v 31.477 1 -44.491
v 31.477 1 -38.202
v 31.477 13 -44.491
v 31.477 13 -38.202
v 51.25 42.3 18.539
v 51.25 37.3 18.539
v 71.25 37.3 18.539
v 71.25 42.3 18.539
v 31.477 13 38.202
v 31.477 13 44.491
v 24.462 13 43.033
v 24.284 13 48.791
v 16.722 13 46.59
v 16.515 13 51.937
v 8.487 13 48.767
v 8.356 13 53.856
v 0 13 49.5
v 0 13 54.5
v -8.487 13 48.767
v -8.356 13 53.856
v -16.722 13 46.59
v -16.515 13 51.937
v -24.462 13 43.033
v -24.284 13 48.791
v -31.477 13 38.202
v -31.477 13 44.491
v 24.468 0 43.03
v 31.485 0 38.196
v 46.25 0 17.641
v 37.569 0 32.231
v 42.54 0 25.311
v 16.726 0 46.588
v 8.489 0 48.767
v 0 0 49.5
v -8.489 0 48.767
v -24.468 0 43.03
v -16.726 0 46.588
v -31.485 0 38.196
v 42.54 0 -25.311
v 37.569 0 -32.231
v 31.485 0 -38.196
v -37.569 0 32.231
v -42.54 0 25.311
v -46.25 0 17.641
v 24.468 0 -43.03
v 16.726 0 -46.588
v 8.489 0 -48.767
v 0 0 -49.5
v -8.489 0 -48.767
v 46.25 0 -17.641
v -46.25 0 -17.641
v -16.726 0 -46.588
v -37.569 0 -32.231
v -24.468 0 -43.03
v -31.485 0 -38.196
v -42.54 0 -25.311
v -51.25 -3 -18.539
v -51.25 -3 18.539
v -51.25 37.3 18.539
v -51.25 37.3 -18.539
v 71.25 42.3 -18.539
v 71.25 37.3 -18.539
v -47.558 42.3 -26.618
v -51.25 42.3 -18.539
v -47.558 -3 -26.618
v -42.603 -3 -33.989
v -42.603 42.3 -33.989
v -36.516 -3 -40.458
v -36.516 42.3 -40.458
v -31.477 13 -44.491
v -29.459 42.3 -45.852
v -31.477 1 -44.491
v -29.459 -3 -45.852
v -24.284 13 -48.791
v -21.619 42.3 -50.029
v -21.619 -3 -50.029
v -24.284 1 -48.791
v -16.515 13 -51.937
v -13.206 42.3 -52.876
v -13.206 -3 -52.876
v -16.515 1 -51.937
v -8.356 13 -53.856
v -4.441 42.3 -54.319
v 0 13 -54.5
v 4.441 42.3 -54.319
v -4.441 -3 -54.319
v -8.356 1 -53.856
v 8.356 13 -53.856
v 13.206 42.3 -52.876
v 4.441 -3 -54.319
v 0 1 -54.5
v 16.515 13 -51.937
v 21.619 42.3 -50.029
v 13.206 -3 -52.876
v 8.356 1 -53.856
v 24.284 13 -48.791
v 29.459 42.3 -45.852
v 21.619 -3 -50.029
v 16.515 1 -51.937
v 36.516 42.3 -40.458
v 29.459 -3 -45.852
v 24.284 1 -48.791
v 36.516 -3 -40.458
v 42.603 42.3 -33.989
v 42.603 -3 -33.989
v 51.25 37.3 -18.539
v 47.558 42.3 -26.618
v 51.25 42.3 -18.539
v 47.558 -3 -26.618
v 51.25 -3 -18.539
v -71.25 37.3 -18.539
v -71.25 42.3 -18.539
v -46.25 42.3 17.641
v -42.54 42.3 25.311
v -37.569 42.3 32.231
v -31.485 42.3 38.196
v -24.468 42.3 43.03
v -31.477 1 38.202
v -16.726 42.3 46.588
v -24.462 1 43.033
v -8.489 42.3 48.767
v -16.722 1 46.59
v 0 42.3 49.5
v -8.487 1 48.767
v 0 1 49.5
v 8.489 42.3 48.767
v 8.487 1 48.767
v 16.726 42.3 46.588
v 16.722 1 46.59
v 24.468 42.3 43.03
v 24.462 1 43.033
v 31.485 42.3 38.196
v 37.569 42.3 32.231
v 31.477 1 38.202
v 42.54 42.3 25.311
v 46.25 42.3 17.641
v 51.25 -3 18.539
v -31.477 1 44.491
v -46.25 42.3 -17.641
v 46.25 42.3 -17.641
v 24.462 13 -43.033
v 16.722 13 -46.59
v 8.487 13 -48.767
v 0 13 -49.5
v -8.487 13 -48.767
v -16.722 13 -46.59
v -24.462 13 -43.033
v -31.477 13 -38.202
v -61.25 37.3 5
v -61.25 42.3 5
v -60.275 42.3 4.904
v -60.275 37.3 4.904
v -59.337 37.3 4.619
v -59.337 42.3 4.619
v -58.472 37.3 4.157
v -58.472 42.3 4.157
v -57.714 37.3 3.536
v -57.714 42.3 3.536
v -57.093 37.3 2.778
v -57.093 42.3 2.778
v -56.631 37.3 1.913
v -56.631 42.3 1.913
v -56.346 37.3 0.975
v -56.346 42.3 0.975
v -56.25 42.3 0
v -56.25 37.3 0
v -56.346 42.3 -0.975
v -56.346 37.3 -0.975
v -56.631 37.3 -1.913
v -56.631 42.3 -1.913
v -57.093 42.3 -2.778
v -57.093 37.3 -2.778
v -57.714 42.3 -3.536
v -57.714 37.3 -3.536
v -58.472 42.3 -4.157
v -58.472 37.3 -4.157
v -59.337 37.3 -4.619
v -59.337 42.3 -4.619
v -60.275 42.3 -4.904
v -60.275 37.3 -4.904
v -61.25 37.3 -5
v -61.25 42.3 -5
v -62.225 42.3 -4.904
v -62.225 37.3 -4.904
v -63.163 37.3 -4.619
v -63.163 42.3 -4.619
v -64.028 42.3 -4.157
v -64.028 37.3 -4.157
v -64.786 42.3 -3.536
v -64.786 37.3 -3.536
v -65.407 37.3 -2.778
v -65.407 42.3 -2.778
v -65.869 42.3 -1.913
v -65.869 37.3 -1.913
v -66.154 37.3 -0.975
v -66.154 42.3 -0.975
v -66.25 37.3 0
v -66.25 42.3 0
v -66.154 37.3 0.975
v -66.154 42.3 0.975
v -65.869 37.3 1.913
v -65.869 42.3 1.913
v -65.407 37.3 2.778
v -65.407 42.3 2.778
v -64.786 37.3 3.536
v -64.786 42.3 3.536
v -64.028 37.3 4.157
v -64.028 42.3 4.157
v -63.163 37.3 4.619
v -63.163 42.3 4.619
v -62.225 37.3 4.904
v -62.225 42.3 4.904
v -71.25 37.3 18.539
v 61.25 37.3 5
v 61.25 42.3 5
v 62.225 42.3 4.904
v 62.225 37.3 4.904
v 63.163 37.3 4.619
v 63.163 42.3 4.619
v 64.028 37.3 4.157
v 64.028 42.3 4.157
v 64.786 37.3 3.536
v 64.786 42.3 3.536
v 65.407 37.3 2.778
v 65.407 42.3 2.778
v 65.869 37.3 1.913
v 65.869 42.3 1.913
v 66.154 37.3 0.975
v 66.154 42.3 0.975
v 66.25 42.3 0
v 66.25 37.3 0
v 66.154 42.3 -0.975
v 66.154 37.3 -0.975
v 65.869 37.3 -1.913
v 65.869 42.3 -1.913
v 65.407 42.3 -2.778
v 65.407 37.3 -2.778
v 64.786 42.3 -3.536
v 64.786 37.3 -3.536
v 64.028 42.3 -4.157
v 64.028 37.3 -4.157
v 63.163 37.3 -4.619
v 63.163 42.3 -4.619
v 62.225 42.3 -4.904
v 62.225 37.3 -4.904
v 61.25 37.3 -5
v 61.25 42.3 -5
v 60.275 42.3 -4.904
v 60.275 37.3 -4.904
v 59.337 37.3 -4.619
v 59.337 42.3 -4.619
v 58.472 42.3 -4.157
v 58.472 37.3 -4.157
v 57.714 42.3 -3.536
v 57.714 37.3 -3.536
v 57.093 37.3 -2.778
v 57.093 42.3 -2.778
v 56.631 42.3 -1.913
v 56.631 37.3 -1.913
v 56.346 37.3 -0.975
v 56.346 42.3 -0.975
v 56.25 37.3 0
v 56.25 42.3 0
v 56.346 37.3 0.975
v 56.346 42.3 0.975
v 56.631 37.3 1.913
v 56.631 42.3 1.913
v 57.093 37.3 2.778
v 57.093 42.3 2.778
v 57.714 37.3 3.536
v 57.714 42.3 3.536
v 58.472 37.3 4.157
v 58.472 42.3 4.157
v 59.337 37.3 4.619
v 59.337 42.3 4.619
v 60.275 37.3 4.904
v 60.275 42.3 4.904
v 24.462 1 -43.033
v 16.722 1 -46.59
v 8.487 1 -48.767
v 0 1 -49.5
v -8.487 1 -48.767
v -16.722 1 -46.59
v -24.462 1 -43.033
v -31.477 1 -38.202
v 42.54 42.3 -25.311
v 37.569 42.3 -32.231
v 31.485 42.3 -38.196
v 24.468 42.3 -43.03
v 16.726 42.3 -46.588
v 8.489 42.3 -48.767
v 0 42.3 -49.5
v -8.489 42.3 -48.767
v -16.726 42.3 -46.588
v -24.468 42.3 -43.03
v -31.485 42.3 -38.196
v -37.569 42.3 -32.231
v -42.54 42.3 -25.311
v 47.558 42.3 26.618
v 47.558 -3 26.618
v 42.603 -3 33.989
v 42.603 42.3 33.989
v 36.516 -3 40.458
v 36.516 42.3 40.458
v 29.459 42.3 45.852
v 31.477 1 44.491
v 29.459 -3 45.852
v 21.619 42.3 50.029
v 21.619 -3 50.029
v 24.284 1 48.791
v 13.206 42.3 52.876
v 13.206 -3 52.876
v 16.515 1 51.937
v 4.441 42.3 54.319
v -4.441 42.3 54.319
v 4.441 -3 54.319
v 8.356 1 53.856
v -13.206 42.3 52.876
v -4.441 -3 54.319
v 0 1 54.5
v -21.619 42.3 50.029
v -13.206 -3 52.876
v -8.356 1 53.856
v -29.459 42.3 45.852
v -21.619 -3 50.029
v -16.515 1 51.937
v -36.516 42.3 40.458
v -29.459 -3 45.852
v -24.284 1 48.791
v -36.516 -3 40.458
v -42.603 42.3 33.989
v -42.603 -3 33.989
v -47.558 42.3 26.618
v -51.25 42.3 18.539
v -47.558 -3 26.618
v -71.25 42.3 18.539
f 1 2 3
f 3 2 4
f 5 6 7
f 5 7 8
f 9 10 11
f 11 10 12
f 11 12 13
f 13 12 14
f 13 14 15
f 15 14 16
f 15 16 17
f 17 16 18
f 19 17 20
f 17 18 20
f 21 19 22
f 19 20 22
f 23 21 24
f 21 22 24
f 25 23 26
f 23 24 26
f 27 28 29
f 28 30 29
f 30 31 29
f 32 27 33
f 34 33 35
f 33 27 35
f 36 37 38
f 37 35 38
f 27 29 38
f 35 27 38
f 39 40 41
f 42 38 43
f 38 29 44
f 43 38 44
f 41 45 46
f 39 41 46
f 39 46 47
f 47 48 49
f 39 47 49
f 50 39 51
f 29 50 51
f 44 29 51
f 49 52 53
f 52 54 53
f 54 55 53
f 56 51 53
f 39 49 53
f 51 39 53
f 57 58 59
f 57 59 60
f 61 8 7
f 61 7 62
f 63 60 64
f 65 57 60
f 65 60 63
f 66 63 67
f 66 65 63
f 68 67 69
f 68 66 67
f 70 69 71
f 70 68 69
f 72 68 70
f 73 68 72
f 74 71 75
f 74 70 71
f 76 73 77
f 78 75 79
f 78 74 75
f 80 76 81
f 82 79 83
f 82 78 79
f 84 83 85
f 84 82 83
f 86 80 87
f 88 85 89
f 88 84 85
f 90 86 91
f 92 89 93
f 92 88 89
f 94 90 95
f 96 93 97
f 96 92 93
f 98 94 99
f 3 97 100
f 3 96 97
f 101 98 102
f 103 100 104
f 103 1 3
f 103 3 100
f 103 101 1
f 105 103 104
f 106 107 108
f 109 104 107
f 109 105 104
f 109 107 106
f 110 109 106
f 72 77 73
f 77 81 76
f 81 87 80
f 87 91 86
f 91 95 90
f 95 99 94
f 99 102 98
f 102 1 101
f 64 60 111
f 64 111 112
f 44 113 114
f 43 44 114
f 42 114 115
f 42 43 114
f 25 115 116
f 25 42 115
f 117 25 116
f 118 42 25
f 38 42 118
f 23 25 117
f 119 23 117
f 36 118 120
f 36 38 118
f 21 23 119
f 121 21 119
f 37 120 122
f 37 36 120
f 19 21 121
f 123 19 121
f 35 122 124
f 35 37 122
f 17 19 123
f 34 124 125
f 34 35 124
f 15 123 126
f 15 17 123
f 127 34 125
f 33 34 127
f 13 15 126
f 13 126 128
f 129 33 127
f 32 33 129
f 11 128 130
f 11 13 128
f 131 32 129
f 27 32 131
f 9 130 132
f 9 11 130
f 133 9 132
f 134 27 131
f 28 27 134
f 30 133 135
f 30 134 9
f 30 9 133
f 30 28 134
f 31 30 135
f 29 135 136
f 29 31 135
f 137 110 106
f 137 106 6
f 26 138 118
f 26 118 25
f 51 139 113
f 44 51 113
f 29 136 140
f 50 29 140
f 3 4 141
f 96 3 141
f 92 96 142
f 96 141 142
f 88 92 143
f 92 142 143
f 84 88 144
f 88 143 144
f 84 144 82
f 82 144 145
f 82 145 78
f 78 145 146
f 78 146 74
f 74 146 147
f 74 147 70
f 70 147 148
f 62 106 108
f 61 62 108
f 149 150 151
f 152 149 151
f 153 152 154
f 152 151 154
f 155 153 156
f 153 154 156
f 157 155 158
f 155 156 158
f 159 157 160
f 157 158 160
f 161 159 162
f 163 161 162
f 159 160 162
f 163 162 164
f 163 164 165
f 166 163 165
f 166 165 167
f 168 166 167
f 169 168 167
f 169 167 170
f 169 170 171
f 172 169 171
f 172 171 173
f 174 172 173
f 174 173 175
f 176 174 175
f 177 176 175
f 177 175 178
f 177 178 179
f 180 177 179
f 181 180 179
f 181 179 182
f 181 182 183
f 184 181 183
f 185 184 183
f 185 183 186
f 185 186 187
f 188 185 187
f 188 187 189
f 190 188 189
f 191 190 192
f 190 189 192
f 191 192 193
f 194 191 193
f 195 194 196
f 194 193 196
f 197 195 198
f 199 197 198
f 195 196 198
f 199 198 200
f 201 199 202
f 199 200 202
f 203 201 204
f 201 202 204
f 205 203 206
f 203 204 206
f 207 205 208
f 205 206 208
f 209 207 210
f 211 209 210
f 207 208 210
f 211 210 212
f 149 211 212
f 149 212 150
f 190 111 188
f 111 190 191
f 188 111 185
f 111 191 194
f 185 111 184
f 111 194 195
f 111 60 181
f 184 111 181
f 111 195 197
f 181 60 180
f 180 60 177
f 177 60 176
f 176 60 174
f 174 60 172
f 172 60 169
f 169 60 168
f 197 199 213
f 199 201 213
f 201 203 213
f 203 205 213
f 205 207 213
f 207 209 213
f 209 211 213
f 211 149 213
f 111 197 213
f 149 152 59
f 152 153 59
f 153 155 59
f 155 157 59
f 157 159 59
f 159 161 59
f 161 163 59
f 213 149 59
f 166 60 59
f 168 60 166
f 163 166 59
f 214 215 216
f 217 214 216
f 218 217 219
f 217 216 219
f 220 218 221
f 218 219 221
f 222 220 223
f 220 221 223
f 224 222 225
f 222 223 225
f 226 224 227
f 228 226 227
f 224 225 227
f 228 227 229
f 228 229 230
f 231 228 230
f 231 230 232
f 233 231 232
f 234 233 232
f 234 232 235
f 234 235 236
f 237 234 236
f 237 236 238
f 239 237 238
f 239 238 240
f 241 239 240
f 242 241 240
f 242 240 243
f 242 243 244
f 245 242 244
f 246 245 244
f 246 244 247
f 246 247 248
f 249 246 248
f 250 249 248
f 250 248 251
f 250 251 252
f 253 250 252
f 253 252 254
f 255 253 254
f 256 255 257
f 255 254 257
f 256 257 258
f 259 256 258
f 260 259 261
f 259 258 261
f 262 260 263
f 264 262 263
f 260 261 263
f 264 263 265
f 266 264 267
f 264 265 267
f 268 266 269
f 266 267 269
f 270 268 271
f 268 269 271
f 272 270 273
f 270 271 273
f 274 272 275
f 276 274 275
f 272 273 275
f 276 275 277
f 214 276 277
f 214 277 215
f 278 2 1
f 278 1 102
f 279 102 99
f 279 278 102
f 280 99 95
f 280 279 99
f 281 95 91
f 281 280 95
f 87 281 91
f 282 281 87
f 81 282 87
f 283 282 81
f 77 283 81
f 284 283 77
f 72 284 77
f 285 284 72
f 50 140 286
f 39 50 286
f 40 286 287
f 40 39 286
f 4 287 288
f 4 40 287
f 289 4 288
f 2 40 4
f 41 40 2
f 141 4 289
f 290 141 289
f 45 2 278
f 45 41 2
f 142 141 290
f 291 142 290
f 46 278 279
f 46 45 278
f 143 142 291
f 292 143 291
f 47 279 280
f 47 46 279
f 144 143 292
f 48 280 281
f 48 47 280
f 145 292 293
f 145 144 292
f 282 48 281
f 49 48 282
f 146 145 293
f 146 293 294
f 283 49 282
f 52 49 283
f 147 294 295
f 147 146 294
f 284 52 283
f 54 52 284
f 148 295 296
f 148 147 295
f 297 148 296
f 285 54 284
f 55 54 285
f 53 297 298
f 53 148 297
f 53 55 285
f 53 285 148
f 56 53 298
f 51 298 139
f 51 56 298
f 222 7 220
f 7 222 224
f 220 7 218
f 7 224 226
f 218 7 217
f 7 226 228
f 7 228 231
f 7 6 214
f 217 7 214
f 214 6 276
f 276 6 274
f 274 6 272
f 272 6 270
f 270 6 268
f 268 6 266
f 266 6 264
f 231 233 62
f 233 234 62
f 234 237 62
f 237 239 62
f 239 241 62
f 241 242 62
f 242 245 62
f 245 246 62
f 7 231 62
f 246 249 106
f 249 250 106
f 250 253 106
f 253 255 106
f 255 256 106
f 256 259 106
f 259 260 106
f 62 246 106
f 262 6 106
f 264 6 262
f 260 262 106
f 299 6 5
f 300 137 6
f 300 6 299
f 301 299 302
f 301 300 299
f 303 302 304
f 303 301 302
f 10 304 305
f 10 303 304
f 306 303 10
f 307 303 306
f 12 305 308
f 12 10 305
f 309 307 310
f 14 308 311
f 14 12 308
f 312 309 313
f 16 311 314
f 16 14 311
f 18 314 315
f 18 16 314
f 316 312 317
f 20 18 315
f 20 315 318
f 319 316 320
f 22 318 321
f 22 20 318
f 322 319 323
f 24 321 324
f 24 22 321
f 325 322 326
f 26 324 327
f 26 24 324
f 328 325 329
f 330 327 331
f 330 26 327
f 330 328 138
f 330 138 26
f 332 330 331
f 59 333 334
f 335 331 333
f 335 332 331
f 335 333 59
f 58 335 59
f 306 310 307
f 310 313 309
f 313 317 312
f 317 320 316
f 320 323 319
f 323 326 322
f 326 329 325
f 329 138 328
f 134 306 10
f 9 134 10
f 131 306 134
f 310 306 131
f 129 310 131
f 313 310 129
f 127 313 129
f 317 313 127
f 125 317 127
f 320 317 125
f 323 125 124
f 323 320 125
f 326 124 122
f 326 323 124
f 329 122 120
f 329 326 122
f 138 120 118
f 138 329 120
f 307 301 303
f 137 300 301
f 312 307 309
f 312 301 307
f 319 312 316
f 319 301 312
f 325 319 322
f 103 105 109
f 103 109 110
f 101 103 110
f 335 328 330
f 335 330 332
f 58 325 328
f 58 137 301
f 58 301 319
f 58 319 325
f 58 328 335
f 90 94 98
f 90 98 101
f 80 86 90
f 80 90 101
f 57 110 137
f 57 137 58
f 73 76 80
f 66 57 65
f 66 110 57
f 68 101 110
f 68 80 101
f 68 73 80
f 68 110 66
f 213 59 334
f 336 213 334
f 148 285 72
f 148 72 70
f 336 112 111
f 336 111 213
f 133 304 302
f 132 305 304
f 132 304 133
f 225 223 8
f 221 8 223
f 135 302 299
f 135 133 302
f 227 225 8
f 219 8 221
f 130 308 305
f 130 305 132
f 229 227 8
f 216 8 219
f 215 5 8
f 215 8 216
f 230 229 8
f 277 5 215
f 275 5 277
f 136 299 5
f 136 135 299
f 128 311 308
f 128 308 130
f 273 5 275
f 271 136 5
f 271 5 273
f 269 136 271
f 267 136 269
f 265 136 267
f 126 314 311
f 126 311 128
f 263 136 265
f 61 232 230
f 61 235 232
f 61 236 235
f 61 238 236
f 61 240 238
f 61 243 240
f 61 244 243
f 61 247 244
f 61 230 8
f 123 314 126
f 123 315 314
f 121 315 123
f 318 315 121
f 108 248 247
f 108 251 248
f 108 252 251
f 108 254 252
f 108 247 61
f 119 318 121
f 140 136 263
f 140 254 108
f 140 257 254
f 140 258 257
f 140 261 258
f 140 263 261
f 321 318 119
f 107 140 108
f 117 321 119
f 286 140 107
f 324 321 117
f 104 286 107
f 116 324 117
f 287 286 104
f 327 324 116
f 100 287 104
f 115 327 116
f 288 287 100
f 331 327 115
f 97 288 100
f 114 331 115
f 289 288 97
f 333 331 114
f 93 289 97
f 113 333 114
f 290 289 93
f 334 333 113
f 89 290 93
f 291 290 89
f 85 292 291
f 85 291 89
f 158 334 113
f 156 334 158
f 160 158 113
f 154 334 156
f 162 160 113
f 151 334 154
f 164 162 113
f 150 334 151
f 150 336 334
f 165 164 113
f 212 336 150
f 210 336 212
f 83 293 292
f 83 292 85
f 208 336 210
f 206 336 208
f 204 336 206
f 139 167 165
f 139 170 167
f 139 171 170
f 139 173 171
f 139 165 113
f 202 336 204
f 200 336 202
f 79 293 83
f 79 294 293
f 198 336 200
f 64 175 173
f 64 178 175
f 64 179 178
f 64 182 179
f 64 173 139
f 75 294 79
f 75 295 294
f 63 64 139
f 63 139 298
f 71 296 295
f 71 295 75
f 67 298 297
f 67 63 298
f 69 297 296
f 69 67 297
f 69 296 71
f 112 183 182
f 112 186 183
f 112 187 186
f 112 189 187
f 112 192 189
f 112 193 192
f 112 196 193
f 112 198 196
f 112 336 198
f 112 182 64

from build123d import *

# Parameters (mm, degrees)
EXTRUDE_1_DEPTH          = 42.3
EXTRUDE_START            = 3
EXTRUDE_2_DEPTH          = 3
SKETCH_3_W               = 37.077621282
SKETCH_3_H               = 5
EXTRUDE_4_DEPTH          = 20
SKETCH_5_W               = 37.077621282
SKETCH_5_H               = 5
EXTRUDE_5_DEPTH          = 20
CUT_EXTRUDE_1_REACH      = 102.493
SKETCH_6_R               = 5
CUT_EXTRUDE_2_REACH      = 102.493
SKETCH_7_R               = 5
CUT_EXTRUDE_3_DEPTH      = 137.919145849
CUT_EXTRUDE_3_DEPTH_BACK = 137.919145849
SKETCH_9_W               = 62.954996742
SKETCH_9_H               = 12


with BuildPart() as part:
    # 草图1 → 凸台-拉伸1 (new body)
    with BuildSketch(Plane(origin=(0, 0, 0), x_dir=(1, 0, 0), z_dir=(0, 1, 0))):
        with BuildLine():
            Line((-51.25, 18.538810641), (-51.25, -18.538810641))
            ThreePointArc((-51.25, -18.538810641), (0, -54.5), (51.25, -18.538810641))
            Line((51.25, -18.538810641), (51.25, 18.538810641))
            ThreePointArc((51.25, 18.538810641), (0, 54.5), (-51.25, 18.538810641))
        make_face()
        with BuildLine():
            Line((-46.25, 17.640507362), (-46.25, -17.640507362))
            ThreePointArc((-46.25, -17.640507362), (0, -49.5), (46.25, -17.640507362))
            Line((46.25, -17.640507362), (46.25, 17.640507362))
            ThreePointArc((46.25, 17.640507362), (0, 49.5), (-46.25, 17.640507362))
        make_face(mode=Mode.SUBTRACT)
    extrude(amount=EXTRUDE_1_DEPTH)

    # 草图2 → 凸台-拉伸2 (add)
    with BuildSketch(Plane(origin=(0, 0, 0), x_dir=(-1, 0, 0), z_dir=(0, -1, 0)).offset(EXTRUDE_START)):
        with BuildLine():
            Line((51.25, -18.538810641), (51.25, 18.538810641))
            ThreePointArc((51.25, 18.538810641), (0, 54.5), (-51.25, 18.538810641))
            Line((-51.25, 18.538810641), (-51.25, -18.538810641))
            ThreePointArc((-51.25, -18.538810641), (0, -54.5), (51.25, -18.538810641))
        make_face()
    extrude(amount=-EXTRUDE_2_DEPTH)

    # 草图3 → 凸台-拉伸4 (add)
    with BuildSketch(Plane.ZY.offset(51.25)):
        with Locations((0, 39.8)):
            Rectangle(SKETCH_3_W, SKETCH_3_H)
    extrude(amount=EXTRUDE_4_DEPTH)

    # 草图5 → 凸台-拉伸5 (add)
    with BuildSketch(Plane(origin=(51.25, 0, 0), x_dir=(0, 0, -1), z_dir=(1, 0, 0))):
        with Locations((0, 39.8)):
            Rectangle(SKETCH_5_W, SKETCH_5_H)
    extrude(amount=EXTRUDE_5_DEPTH)

    # 草图6 → 切除-拉伸1 (cut, up to next)
    with BuildSketch(Plane(origin=(0, 42.3, 0), x_dir=(1, 0, 0), z_dir=(0, 1, 0)), mode=Mode.PRIVATE) as cut_extrude_1_sk1:
        with Locations((-61.25, 0)):
            Circle(SKETCH_6_R)
    cut_extrude_1_tool1 = extrude(cut_extrude_1_sk1.sketch, amount=-CUT_EXTRUDE_1_REACH, mode=Mode.PRIVATE) & part.part
    add(cut_extrude_1_tool1.solids().sort_by_distance((-61.25, 42.3, 0))[0], mode=Mode.SUBTRACT)

    # 草图7 → 切除-拉伸2 (cut, up to next)
    with BuildSketch(Plane(origin=(0, 42.3, 0), x_dir=(1, 0, 0), z_dir=(0, 1, 0)), mode=Mode.PRIVATE) as cut_extrude_2_sk1:
        with Locations((61.25, 0)):
            Circle(SKETCH_7_R)
    cut_extrude_2_tool1 = extrude(cut_extrude_2_sk1.sketch, amount=-CUT_EXTRUDE_2_REACH, mode=Mode.PRIVATE) & part.part
    add(cut_extrude_2_tool1.solids().sort_by_distance((61.25, 42.3, 0))[0], mode=Mode.SUBTRACT)

    # 草图9 → 切除-拉伸3 (cut, two sides: drawn at the far end of the back side and taken through both)
    with BuildSketch(Plane(origin=(0, 0, -54.5), x_dir=(-1, 0, 0), z_dir=(0, 0, -1)).offset(-CUT_EXTRUDE_3_DEPTH_BACK)):
        with Locations((0, 7)):
            Rectangle(SKETCH_9_W, SKETCH_9_H)
    extrude(amount=CUT_EXTRUDE_3_DEPTH + CUT_EXTRUDE_3_DEPTH_BACK, mode=Mode.SUBTRACT)


solid = part.part
